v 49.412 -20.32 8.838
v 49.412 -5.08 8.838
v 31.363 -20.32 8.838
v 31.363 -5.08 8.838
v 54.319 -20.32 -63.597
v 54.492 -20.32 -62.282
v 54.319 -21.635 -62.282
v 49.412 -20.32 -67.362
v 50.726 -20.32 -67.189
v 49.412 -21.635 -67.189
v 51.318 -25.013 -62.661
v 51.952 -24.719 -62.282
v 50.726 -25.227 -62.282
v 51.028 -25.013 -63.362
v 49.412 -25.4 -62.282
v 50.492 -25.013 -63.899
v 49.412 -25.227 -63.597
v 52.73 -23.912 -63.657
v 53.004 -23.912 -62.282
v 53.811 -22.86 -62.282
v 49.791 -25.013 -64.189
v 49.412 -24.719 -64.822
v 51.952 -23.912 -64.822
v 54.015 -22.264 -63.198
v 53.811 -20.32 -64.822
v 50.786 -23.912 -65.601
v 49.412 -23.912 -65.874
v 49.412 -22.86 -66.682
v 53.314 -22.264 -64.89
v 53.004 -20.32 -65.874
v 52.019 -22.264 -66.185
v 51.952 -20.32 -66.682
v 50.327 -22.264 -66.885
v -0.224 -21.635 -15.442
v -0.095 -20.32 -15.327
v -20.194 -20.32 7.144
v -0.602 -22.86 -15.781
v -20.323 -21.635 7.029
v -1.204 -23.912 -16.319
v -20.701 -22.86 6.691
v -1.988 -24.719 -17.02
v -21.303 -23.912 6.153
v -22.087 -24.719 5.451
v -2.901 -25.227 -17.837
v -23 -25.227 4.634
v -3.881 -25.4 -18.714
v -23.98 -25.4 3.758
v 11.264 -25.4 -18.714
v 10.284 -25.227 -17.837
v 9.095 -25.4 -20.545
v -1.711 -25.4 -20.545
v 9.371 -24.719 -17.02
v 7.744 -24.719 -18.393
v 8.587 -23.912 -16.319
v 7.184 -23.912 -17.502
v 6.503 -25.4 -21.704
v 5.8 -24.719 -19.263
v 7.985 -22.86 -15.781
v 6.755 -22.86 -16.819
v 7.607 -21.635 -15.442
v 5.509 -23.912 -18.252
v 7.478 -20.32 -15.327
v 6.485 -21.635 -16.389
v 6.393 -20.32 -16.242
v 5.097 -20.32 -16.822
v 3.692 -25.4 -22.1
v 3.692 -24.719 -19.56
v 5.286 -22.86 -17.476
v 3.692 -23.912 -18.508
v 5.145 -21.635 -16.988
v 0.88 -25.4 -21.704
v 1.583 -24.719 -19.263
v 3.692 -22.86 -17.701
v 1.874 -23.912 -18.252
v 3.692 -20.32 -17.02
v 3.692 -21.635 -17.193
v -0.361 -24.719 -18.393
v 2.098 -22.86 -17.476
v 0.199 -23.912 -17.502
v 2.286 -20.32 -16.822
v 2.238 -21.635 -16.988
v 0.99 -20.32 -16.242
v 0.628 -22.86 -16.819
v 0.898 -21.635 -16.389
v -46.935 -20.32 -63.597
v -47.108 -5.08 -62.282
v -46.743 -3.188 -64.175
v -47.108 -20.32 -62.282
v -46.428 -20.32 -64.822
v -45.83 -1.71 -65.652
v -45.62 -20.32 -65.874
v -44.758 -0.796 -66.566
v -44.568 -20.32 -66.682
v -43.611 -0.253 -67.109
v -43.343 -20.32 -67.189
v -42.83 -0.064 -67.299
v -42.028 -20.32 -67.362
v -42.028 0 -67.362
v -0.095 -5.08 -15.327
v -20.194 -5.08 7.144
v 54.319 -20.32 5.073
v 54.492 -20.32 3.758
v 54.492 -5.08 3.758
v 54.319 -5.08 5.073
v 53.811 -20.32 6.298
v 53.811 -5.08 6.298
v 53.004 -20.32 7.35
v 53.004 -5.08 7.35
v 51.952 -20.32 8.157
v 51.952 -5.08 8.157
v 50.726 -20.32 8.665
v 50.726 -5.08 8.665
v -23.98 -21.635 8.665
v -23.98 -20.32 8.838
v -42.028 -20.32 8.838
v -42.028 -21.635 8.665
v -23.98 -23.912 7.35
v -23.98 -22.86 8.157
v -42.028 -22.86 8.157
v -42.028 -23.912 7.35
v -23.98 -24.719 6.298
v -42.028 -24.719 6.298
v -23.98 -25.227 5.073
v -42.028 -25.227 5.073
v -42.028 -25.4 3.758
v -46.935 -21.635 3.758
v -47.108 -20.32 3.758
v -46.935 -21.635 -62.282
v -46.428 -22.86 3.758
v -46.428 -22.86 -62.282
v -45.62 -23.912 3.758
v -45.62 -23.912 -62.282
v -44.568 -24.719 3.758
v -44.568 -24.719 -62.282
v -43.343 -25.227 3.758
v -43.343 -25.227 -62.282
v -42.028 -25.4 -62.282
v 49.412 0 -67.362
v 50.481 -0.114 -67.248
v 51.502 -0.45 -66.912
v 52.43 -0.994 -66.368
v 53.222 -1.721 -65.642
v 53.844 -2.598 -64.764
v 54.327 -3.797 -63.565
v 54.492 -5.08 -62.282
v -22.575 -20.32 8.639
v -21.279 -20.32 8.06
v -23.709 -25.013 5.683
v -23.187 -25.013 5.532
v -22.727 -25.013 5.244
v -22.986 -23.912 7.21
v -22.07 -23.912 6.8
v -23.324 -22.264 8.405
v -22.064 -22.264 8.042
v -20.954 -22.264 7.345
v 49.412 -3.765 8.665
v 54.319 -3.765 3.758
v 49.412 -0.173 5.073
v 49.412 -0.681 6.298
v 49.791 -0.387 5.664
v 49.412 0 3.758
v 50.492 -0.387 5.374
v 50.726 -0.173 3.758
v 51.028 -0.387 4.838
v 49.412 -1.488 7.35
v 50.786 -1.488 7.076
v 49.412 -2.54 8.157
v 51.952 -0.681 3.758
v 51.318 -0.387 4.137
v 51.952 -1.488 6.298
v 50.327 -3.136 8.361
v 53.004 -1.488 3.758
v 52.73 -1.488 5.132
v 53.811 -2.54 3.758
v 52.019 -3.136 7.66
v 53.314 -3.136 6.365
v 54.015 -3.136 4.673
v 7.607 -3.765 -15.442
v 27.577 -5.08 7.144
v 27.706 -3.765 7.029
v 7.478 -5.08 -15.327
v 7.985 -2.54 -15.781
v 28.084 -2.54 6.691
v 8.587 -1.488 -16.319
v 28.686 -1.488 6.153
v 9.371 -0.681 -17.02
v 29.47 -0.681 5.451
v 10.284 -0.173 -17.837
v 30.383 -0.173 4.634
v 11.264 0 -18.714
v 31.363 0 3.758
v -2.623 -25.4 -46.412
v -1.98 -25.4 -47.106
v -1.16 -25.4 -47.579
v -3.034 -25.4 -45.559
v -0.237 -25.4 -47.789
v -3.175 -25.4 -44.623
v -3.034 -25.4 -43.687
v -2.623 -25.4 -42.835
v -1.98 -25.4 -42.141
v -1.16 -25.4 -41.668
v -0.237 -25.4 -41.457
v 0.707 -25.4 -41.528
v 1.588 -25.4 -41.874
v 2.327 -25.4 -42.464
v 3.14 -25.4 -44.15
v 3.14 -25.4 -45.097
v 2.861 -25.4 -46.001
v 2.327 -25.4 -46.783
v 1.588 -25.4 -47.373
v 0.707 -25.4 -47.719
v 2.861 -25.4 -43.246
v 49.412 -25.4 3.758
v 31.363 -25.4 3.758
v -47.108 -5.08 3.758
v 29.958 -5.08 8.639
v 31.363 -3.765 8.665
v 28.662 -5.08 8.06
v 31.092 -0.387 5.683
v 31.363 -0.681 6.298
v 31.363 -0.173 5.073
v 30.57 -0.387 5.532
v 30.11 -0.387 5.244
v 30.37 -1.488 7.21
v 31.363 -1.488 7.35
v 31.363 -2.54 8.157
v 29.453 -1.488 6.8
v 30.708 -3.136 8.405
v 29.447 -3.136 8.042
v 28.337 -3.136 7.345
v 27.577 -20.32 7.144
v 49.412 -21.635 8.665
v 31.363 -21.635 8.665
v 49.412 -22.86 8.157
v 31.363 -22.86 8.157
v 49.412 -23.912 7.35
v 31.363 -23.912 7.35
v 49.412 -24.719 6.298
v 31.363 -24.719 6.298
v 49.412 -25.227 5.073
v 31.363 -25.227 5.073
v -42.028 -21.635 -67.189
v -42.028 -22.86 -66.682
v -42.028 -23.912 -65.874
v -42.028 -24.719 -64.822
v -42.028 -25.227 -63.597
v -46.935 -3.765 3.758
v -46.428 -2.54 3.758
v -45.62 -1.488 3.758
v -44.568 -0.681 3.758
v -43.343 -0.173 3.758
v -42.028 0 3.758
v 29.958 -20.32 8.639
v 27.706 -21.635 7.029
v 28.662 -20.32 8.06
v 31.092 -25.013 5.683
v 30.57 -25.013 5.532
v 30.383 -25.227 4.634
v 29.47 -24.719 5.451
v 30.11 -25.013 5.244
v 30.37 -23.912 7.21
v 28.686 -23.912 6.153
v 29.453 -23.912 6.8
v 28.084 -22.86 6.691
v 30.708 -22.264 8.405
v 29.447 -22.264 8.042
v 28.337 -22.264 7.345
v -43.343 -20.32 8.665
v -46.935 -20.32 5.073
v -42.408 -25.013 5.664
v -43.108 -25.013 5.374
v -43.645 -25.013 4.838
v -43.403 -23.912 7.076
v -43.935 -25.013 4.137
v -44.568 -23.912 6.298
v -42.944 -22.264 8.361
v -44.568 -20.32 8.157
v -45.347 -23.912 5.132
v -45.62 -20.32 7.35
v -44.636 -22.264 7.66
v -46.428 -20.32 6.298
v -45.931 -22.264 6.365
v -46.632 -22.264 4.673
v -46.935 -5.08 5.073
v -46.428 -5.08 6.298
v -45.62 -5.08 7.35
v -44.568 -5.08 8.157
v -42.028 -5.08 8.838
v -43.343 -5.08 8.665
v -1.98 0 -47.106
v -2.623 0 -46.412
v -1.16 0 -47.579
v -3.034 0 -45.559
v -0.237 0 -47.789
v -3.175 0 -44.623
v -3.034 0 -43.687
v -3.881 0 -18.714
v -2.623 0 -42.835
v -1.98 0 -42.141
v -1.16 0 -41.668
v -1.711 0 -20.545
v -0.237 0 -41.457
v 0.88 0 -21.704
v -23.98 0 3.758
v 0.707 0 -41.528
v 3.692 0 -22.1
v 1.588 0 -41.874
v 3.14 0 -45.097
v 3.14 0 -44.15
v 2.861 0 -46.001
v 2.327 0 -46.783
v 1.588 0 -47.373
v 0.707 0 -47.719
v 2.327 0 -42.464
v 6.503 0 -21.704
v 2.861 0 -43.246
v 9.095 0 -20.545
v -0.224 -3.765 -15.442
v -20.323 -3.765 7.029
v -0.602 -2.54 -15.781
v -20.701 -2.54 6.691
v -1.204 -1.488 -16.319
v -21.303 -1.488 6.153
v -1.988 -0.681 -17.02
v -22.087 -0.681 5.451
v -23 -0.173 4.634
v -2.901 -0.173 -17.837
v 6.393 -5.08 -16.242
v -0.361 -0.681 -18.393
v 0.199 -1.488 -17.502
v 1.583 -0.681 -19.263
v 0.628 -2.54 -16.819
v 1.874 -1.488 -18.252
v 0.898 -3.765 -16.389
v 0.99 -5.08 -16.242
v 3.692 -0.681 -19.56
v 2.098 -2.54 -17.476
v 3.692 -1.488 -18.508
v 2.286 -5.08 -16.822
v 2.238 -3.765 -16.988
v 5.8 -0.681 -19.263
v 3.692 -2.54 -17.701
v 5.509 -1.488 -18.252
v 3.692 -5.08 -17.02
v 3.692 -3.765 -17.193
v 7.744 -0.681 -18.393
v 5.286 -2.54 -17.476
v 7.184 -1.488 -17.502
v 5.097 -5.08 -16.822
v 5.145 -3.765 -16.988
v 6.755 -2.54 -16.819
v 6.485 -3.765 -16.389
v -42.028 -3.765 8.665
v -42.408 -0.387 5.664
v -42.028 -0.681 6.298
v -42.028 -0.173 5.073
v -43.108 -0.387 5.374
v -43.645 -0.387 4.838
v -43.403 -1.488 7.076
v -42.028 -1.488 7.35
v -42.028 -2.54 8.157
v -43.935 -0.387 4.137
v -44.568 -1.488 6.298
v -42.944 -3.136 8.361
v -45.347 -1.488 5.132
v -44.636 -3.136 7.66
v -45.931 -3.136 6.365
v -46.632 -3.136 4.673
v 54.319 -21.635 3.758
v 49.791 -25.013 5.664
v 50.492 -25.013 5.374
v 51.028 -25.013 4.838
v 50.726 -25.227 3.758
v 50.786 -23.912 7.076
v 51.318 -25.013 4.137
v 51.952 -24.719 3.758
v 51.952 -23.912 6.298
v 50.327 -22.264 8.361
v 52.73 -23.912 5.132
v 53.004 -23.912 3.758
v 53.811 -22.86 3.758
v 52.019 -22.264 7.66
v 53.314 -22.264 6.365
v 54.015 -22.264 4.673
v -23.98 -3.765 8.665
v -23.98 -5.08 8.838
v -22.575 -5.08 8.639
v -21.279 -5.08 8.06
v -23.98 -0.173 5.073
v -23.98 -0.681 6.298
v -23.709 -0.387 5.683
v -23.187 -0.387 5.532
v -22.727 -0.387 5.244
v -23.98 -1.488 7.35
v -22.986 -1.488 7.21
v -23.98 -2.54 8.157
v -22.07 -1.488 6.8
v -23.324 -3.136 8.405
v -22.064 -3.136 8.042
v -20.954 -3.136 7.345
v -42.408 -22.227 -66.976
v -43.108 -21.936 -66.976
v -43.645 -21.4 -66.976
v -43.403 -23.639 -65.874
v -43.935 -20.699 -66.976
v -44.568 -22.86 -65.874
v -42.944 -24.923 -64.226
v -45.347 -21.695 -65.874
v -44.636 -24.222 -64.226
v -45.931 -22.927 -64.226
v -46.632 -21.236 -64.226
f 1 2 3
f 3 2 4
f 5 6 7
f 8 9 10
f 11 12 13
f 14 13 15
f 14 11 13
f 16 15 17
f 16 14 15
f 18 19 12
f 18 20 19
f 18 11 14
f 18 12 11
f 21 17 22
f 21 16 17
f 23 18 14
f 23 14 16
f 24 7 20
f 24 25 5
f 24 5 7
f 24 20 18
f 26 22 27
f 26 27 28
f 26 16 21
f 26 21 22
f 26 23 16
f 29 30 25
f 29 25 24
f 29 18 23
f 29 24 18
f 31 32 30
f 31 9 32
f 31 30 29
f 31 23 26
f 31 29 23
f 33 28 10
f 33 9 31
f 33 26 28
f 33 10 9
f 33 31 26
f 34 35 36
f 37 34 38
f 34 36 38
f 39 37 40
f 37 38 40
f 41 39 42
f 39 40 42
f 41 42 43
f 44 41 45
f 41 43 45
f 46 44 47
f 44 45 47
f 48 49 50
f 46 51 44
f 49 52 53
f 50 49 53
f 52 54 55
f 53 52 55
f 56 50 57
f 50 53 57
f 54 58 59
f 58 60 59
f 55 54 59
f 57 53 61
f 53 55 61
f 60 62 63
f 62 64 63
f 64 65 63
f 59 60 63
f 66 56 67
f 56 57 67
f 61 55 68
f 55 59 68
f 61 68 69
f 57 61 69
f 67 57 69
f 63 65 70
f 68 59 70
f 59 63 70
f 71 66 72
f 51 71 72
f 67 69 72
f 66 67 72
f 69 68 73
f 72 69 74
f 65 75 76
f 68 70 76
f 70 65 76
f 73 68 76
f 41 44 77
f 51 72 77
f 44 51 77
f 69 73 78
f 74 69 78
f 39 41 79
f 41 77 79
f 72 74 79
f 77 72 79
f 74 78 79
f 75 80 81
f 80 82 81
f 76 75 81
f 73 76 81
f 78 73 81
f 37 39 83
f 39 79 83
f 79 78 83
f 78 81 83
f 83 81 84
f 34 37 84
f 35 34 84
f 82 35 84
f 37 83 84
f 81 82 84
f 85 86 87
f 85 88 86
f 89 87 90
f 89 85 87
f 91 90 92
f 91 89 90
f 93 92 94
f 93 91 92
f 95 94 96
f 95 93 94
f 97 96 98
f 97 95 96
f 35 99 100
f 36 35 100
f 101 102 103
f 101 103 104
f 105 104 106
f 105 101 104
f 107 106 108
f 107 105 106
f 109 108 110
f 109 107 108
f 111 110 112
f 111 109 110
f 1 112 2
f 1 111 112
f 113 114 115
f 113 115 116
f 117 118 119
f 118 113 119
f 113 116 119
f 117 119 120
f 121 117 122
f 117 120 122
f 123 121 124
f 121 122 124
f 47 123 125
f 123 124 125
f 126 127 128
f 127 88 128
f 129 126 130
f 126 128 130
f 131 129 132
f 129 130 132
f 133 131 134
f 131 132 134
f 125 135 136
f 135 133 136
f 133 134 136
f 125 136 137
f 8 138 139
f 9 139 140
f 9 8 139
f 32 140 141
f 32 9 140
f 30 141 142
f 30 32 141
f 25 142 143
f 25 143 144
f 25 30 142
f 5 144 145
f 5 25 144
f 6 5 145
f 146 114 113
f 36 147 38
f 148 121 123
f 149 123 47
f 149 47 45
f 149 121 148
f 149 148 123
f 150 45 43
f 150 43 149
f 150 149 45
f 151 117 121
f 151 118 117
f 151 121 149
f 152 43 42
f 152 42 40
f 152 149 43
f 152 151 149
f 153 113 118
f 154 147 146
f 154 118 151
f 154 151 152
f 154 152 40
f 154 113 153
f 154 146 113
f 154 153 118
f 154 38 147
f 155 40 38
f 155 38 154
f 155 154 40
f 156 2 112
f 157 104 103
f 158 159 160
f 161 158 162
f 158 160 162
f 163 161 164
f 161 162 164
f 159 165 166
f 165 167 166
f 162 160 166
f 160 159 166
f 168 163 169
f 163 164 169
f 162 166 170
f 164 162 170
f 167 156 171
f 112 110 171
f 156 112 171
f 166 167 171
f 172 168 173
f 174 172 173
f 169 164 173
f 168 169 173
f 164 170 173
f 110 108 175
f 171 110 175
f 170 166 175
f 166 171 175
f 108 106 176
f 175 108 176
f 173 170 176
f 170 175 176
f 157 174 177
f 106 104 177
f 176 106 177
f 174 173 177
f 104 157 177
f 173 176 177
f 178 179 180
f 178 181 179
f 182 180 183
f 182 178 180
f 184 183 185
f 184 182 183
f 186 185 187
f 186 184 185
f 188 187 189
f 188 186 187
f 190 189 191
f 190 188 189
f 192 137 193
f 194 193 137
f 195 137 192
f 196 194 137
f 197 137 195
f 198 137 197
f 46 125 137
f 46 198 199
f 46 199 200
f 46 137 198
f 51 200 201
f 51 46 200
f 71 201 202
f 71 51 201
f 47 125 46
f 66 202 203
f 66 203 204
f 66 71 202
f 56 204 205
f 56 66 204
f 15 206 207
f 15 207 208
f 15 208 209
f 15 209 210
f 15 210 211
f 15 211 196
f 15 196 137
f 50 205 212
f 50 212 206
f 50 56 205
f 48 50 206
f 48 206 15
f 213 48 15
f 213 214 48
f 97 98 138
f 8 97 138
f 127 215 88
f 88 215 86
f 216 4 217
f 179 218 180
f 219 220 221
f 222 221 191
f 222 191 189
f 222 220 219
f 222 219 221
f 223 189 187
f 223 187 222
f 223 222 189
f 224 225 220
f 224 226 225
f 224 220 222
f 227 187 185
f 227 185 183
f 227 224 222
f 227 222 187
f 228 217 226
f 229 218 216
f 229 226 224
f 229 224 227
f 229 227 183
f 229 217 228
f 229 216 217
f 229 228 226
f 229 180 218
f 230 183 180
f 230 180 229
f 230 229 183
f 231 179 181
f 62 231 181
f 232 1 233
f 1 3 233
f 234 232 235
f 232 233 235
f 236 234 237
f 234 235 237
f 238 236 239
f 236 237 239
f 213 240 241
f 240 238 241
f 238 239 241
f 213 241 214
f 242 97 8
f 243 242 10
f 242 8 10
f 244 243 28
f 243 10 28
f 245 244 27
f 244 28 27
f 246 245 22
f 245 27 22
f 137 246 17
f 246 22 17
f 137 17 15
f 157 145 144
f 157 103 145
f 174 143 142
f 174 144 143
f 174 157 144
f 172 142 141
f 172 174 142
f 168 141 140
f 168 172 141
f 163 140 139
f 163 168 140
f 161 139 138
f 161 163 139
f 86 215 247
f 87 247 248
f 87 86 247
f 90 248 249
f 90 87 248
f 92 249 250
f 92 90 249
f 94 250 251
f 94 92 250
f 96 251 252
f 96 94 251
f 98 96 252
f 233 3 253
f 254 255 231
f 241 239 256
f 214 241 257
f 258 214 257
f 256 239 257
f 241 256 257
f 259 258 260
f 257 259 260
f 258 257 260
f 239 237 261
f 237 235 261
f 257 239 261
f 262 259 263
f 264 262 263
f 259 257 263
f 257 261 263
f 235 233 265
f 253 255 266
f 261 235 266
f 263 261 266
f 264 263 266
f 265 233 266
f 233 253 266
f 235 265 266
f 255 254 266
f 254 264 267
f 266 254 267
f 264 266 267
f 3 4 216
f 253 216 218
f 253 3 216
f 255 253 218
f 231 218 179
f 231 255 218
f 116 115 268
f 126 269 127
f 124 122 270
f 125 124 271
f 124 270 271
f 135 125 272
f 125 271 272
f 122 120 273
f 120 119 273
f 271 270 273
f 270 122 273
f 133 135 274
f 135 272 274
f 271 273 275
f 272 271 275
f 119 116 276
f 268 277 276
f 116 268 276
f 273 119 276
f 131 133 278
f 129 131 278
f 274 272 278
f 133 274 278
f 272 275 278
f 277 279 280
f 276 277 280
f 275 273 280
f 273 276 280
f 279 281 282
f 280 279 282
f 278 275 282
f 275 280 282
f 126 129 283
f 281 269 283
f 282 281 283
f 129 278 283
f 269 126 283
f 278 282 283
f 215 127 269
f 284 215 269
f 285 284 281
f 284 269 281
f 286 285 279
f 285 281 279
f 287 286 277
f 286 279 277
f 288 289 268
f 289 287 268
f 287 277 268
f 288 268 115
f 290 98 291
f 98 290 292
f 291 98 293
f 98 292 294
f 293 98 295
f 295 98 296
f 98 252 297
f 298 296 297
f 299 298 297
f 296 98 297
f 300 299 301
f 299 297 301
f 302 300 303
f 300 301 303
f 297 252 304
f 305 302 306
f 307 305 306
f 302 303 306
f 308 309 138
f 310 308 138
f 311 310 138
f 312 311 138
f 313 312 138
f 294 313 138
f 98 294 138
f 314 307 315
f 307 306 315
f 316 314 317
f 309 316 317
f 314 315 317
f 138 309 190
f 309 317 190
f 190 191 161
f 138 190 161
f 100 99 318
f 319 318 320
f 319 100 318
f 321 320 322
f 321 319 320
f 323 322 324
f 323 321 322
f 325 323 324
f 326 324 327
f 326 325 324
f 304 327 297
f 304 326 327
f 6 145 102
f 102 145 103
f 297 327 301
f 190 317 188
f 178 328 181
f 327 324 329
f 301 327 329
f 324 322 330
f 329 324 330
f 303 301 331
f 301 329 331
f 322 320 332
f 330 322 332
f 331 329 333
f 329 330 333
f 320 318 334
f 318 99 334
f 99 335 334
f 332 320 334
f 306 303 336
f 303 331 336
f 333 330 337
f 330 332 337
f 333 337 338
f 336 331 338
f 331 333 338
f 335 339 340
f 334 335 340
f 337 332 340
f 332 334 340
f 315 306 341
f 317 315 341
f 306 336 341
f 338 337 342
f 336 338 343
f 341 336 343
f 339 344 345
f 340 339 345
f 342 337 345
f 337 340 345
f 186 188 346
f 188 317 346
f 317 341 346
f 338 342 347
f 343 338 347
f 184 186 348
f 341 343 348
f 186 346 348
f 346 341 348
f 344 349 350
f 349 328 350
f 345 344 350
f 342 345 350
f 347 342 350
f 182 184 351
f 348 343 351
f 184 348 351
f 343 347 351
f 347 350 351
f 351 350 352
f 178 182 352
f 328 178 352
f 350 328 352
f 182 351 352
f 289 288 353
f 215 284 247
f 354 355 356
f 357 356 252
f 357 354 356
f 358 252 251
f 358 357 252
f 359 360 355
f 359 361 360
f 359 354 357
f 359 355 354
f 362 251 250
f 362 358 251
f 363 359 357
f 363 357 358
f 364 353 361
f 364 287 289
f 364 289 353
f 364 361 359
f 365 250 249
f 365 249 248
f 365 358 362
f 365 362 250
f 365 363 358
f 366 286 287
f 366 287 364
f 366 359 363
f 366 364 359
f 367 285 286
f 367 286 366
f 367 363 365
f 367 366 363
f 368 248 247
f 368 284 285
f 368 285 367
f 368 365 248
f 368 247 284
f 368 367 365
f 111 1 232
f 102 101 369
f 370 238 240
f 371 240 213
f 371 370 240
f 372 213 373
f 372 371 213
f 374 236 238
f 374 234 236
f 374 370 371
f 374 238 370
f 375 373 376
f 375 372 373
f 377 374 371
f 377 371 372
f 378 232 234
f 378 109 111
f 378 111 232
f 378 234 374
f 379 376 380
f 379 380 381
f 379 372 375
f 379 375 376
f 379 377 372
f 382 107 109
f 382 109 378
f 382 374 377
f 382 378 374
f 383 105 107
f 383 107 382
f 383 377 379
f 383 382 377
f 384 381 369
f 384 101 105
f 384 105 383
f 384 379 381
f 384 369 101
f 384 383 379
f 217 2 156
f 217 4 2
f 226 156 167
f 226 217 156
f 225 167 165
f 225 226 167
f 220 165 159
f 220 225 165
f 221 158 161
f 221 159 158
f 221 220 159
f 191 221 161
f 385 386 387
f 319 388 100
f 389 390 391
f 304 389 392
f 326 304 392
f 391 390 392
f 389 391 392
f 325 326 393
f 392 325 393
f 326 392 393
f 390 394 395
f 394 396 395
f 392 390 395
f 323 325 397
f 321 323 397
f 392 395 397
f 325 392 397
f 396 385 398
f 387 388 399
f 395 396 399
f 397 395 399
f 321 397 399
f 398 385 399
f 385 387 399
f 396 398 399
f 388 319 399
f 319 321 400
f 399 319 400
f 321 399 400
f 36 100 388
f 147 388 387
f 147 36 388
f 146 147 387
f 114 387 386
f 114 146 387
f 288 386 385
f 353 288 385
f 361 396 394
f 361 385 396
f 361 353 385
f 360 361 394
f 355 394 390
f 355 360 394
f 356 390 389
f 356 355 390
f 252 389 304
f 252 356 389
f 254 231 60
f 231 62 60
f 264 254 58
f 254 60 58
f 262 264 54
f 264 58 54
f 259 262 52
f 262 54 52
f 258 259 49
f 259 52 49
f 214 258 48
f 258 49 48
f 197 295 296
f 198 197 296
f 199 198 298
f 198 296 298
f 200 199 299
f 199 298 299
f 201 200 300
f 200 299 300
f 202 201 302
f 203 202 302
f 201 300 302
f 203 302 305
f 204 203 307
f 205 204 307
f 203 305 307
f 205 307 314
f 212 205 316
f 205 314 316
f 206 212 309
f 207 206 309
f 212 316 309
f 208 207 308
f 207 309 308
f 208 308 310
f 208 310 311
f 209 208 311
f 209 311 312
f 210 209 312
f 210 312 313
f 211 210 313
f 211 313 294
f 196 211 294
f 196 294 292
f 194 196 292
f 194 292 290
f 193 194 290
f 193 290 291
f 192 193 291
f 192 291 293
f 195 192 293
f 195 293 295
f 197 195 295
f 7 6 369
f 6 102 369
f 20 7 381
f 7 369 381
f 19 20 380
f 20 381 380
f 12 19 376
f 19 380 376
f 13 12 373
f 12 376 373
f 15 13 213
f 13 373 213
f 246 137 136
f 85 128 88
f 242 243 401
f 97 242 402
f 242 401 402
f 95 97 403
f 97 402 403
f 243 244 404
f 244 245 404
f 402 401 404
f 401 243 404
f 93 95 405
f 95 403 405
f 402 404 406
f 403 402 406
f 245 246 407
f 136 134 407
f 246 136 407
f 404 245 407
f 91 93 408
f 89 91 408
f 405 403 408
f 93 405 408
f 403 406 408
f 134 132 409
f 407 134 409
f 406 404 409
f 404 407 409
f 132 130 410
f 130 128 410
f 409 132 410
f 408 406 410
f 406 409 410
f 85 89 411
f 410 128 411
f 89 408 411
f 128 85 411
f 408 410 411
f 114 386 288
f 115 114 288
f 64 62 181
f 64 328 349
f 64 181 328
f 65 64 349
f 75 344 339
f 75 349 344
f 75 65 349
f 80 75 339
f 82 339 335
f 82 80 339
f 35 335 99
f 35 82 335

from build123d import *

# Parameters (mm, degrees)
F1_DEPTH = 25.4
F2_R     = 5.08
F4_D     = 6.35


with BuildPart() as f1:
    # F0 (on Front) → F1 (new body)
    with BuildSketch(Plane.XZ):
        Polygon((-47.108385, 8.83777), (-47.108385, -67.36223), (54.491615, -67.36223), (54.491615, 8.83777), (29.091615, 8.83777), (3.691615, -19.560294), (-21.708385, 8.83777), align=None)
    extrude(amount=F1_DEPTH)

    # F2
    f2_edges = [f1.edges().sort_by_distance(p)[0] for p in [
        (-21.708385, -12.7, 8.83777),
        (-47.108385, -12.7, 8.83777),
        (-34.408385, 0, 8.83777),
        (-34.408385, -25.4, 8.83777),
        (54.491615, -12.7, 8.83777),
        (29.091615, -12.7, 8.83777),
        (41.791615, 0, 8.83777),
        (41.791615, -25.4, 8.83777),
        (54.491615, -12.7, -67.36223),
        (54.491615, 0, -29.26223),
        (54.491615, -25.4, -29.26223),
        (-47.108385, -25.4, -29.26223),
        (3.691615, -25.4, -67.36223),
        (16.391615, -25.4, -5.361262),
        (-9.008385, -25.4, -5.361262),
        (3.691615, -12.7, -19.560294),
        (-9.008385, 0, -5.361262),
        (16.391615, 0, -5.361262),
        (-47.108385, -12.7, -67.36223),
        (-47.108385, 0, -29.26223),
    ]]
    fillet(f2_edges, radius=F2_R)

    # F4 (through all)
    with Locations(Plane.XZ.offset(25.4)):
        with Locations((0, -44.623341)):
            Hole(F4_D / 2)


solid = f1.part
